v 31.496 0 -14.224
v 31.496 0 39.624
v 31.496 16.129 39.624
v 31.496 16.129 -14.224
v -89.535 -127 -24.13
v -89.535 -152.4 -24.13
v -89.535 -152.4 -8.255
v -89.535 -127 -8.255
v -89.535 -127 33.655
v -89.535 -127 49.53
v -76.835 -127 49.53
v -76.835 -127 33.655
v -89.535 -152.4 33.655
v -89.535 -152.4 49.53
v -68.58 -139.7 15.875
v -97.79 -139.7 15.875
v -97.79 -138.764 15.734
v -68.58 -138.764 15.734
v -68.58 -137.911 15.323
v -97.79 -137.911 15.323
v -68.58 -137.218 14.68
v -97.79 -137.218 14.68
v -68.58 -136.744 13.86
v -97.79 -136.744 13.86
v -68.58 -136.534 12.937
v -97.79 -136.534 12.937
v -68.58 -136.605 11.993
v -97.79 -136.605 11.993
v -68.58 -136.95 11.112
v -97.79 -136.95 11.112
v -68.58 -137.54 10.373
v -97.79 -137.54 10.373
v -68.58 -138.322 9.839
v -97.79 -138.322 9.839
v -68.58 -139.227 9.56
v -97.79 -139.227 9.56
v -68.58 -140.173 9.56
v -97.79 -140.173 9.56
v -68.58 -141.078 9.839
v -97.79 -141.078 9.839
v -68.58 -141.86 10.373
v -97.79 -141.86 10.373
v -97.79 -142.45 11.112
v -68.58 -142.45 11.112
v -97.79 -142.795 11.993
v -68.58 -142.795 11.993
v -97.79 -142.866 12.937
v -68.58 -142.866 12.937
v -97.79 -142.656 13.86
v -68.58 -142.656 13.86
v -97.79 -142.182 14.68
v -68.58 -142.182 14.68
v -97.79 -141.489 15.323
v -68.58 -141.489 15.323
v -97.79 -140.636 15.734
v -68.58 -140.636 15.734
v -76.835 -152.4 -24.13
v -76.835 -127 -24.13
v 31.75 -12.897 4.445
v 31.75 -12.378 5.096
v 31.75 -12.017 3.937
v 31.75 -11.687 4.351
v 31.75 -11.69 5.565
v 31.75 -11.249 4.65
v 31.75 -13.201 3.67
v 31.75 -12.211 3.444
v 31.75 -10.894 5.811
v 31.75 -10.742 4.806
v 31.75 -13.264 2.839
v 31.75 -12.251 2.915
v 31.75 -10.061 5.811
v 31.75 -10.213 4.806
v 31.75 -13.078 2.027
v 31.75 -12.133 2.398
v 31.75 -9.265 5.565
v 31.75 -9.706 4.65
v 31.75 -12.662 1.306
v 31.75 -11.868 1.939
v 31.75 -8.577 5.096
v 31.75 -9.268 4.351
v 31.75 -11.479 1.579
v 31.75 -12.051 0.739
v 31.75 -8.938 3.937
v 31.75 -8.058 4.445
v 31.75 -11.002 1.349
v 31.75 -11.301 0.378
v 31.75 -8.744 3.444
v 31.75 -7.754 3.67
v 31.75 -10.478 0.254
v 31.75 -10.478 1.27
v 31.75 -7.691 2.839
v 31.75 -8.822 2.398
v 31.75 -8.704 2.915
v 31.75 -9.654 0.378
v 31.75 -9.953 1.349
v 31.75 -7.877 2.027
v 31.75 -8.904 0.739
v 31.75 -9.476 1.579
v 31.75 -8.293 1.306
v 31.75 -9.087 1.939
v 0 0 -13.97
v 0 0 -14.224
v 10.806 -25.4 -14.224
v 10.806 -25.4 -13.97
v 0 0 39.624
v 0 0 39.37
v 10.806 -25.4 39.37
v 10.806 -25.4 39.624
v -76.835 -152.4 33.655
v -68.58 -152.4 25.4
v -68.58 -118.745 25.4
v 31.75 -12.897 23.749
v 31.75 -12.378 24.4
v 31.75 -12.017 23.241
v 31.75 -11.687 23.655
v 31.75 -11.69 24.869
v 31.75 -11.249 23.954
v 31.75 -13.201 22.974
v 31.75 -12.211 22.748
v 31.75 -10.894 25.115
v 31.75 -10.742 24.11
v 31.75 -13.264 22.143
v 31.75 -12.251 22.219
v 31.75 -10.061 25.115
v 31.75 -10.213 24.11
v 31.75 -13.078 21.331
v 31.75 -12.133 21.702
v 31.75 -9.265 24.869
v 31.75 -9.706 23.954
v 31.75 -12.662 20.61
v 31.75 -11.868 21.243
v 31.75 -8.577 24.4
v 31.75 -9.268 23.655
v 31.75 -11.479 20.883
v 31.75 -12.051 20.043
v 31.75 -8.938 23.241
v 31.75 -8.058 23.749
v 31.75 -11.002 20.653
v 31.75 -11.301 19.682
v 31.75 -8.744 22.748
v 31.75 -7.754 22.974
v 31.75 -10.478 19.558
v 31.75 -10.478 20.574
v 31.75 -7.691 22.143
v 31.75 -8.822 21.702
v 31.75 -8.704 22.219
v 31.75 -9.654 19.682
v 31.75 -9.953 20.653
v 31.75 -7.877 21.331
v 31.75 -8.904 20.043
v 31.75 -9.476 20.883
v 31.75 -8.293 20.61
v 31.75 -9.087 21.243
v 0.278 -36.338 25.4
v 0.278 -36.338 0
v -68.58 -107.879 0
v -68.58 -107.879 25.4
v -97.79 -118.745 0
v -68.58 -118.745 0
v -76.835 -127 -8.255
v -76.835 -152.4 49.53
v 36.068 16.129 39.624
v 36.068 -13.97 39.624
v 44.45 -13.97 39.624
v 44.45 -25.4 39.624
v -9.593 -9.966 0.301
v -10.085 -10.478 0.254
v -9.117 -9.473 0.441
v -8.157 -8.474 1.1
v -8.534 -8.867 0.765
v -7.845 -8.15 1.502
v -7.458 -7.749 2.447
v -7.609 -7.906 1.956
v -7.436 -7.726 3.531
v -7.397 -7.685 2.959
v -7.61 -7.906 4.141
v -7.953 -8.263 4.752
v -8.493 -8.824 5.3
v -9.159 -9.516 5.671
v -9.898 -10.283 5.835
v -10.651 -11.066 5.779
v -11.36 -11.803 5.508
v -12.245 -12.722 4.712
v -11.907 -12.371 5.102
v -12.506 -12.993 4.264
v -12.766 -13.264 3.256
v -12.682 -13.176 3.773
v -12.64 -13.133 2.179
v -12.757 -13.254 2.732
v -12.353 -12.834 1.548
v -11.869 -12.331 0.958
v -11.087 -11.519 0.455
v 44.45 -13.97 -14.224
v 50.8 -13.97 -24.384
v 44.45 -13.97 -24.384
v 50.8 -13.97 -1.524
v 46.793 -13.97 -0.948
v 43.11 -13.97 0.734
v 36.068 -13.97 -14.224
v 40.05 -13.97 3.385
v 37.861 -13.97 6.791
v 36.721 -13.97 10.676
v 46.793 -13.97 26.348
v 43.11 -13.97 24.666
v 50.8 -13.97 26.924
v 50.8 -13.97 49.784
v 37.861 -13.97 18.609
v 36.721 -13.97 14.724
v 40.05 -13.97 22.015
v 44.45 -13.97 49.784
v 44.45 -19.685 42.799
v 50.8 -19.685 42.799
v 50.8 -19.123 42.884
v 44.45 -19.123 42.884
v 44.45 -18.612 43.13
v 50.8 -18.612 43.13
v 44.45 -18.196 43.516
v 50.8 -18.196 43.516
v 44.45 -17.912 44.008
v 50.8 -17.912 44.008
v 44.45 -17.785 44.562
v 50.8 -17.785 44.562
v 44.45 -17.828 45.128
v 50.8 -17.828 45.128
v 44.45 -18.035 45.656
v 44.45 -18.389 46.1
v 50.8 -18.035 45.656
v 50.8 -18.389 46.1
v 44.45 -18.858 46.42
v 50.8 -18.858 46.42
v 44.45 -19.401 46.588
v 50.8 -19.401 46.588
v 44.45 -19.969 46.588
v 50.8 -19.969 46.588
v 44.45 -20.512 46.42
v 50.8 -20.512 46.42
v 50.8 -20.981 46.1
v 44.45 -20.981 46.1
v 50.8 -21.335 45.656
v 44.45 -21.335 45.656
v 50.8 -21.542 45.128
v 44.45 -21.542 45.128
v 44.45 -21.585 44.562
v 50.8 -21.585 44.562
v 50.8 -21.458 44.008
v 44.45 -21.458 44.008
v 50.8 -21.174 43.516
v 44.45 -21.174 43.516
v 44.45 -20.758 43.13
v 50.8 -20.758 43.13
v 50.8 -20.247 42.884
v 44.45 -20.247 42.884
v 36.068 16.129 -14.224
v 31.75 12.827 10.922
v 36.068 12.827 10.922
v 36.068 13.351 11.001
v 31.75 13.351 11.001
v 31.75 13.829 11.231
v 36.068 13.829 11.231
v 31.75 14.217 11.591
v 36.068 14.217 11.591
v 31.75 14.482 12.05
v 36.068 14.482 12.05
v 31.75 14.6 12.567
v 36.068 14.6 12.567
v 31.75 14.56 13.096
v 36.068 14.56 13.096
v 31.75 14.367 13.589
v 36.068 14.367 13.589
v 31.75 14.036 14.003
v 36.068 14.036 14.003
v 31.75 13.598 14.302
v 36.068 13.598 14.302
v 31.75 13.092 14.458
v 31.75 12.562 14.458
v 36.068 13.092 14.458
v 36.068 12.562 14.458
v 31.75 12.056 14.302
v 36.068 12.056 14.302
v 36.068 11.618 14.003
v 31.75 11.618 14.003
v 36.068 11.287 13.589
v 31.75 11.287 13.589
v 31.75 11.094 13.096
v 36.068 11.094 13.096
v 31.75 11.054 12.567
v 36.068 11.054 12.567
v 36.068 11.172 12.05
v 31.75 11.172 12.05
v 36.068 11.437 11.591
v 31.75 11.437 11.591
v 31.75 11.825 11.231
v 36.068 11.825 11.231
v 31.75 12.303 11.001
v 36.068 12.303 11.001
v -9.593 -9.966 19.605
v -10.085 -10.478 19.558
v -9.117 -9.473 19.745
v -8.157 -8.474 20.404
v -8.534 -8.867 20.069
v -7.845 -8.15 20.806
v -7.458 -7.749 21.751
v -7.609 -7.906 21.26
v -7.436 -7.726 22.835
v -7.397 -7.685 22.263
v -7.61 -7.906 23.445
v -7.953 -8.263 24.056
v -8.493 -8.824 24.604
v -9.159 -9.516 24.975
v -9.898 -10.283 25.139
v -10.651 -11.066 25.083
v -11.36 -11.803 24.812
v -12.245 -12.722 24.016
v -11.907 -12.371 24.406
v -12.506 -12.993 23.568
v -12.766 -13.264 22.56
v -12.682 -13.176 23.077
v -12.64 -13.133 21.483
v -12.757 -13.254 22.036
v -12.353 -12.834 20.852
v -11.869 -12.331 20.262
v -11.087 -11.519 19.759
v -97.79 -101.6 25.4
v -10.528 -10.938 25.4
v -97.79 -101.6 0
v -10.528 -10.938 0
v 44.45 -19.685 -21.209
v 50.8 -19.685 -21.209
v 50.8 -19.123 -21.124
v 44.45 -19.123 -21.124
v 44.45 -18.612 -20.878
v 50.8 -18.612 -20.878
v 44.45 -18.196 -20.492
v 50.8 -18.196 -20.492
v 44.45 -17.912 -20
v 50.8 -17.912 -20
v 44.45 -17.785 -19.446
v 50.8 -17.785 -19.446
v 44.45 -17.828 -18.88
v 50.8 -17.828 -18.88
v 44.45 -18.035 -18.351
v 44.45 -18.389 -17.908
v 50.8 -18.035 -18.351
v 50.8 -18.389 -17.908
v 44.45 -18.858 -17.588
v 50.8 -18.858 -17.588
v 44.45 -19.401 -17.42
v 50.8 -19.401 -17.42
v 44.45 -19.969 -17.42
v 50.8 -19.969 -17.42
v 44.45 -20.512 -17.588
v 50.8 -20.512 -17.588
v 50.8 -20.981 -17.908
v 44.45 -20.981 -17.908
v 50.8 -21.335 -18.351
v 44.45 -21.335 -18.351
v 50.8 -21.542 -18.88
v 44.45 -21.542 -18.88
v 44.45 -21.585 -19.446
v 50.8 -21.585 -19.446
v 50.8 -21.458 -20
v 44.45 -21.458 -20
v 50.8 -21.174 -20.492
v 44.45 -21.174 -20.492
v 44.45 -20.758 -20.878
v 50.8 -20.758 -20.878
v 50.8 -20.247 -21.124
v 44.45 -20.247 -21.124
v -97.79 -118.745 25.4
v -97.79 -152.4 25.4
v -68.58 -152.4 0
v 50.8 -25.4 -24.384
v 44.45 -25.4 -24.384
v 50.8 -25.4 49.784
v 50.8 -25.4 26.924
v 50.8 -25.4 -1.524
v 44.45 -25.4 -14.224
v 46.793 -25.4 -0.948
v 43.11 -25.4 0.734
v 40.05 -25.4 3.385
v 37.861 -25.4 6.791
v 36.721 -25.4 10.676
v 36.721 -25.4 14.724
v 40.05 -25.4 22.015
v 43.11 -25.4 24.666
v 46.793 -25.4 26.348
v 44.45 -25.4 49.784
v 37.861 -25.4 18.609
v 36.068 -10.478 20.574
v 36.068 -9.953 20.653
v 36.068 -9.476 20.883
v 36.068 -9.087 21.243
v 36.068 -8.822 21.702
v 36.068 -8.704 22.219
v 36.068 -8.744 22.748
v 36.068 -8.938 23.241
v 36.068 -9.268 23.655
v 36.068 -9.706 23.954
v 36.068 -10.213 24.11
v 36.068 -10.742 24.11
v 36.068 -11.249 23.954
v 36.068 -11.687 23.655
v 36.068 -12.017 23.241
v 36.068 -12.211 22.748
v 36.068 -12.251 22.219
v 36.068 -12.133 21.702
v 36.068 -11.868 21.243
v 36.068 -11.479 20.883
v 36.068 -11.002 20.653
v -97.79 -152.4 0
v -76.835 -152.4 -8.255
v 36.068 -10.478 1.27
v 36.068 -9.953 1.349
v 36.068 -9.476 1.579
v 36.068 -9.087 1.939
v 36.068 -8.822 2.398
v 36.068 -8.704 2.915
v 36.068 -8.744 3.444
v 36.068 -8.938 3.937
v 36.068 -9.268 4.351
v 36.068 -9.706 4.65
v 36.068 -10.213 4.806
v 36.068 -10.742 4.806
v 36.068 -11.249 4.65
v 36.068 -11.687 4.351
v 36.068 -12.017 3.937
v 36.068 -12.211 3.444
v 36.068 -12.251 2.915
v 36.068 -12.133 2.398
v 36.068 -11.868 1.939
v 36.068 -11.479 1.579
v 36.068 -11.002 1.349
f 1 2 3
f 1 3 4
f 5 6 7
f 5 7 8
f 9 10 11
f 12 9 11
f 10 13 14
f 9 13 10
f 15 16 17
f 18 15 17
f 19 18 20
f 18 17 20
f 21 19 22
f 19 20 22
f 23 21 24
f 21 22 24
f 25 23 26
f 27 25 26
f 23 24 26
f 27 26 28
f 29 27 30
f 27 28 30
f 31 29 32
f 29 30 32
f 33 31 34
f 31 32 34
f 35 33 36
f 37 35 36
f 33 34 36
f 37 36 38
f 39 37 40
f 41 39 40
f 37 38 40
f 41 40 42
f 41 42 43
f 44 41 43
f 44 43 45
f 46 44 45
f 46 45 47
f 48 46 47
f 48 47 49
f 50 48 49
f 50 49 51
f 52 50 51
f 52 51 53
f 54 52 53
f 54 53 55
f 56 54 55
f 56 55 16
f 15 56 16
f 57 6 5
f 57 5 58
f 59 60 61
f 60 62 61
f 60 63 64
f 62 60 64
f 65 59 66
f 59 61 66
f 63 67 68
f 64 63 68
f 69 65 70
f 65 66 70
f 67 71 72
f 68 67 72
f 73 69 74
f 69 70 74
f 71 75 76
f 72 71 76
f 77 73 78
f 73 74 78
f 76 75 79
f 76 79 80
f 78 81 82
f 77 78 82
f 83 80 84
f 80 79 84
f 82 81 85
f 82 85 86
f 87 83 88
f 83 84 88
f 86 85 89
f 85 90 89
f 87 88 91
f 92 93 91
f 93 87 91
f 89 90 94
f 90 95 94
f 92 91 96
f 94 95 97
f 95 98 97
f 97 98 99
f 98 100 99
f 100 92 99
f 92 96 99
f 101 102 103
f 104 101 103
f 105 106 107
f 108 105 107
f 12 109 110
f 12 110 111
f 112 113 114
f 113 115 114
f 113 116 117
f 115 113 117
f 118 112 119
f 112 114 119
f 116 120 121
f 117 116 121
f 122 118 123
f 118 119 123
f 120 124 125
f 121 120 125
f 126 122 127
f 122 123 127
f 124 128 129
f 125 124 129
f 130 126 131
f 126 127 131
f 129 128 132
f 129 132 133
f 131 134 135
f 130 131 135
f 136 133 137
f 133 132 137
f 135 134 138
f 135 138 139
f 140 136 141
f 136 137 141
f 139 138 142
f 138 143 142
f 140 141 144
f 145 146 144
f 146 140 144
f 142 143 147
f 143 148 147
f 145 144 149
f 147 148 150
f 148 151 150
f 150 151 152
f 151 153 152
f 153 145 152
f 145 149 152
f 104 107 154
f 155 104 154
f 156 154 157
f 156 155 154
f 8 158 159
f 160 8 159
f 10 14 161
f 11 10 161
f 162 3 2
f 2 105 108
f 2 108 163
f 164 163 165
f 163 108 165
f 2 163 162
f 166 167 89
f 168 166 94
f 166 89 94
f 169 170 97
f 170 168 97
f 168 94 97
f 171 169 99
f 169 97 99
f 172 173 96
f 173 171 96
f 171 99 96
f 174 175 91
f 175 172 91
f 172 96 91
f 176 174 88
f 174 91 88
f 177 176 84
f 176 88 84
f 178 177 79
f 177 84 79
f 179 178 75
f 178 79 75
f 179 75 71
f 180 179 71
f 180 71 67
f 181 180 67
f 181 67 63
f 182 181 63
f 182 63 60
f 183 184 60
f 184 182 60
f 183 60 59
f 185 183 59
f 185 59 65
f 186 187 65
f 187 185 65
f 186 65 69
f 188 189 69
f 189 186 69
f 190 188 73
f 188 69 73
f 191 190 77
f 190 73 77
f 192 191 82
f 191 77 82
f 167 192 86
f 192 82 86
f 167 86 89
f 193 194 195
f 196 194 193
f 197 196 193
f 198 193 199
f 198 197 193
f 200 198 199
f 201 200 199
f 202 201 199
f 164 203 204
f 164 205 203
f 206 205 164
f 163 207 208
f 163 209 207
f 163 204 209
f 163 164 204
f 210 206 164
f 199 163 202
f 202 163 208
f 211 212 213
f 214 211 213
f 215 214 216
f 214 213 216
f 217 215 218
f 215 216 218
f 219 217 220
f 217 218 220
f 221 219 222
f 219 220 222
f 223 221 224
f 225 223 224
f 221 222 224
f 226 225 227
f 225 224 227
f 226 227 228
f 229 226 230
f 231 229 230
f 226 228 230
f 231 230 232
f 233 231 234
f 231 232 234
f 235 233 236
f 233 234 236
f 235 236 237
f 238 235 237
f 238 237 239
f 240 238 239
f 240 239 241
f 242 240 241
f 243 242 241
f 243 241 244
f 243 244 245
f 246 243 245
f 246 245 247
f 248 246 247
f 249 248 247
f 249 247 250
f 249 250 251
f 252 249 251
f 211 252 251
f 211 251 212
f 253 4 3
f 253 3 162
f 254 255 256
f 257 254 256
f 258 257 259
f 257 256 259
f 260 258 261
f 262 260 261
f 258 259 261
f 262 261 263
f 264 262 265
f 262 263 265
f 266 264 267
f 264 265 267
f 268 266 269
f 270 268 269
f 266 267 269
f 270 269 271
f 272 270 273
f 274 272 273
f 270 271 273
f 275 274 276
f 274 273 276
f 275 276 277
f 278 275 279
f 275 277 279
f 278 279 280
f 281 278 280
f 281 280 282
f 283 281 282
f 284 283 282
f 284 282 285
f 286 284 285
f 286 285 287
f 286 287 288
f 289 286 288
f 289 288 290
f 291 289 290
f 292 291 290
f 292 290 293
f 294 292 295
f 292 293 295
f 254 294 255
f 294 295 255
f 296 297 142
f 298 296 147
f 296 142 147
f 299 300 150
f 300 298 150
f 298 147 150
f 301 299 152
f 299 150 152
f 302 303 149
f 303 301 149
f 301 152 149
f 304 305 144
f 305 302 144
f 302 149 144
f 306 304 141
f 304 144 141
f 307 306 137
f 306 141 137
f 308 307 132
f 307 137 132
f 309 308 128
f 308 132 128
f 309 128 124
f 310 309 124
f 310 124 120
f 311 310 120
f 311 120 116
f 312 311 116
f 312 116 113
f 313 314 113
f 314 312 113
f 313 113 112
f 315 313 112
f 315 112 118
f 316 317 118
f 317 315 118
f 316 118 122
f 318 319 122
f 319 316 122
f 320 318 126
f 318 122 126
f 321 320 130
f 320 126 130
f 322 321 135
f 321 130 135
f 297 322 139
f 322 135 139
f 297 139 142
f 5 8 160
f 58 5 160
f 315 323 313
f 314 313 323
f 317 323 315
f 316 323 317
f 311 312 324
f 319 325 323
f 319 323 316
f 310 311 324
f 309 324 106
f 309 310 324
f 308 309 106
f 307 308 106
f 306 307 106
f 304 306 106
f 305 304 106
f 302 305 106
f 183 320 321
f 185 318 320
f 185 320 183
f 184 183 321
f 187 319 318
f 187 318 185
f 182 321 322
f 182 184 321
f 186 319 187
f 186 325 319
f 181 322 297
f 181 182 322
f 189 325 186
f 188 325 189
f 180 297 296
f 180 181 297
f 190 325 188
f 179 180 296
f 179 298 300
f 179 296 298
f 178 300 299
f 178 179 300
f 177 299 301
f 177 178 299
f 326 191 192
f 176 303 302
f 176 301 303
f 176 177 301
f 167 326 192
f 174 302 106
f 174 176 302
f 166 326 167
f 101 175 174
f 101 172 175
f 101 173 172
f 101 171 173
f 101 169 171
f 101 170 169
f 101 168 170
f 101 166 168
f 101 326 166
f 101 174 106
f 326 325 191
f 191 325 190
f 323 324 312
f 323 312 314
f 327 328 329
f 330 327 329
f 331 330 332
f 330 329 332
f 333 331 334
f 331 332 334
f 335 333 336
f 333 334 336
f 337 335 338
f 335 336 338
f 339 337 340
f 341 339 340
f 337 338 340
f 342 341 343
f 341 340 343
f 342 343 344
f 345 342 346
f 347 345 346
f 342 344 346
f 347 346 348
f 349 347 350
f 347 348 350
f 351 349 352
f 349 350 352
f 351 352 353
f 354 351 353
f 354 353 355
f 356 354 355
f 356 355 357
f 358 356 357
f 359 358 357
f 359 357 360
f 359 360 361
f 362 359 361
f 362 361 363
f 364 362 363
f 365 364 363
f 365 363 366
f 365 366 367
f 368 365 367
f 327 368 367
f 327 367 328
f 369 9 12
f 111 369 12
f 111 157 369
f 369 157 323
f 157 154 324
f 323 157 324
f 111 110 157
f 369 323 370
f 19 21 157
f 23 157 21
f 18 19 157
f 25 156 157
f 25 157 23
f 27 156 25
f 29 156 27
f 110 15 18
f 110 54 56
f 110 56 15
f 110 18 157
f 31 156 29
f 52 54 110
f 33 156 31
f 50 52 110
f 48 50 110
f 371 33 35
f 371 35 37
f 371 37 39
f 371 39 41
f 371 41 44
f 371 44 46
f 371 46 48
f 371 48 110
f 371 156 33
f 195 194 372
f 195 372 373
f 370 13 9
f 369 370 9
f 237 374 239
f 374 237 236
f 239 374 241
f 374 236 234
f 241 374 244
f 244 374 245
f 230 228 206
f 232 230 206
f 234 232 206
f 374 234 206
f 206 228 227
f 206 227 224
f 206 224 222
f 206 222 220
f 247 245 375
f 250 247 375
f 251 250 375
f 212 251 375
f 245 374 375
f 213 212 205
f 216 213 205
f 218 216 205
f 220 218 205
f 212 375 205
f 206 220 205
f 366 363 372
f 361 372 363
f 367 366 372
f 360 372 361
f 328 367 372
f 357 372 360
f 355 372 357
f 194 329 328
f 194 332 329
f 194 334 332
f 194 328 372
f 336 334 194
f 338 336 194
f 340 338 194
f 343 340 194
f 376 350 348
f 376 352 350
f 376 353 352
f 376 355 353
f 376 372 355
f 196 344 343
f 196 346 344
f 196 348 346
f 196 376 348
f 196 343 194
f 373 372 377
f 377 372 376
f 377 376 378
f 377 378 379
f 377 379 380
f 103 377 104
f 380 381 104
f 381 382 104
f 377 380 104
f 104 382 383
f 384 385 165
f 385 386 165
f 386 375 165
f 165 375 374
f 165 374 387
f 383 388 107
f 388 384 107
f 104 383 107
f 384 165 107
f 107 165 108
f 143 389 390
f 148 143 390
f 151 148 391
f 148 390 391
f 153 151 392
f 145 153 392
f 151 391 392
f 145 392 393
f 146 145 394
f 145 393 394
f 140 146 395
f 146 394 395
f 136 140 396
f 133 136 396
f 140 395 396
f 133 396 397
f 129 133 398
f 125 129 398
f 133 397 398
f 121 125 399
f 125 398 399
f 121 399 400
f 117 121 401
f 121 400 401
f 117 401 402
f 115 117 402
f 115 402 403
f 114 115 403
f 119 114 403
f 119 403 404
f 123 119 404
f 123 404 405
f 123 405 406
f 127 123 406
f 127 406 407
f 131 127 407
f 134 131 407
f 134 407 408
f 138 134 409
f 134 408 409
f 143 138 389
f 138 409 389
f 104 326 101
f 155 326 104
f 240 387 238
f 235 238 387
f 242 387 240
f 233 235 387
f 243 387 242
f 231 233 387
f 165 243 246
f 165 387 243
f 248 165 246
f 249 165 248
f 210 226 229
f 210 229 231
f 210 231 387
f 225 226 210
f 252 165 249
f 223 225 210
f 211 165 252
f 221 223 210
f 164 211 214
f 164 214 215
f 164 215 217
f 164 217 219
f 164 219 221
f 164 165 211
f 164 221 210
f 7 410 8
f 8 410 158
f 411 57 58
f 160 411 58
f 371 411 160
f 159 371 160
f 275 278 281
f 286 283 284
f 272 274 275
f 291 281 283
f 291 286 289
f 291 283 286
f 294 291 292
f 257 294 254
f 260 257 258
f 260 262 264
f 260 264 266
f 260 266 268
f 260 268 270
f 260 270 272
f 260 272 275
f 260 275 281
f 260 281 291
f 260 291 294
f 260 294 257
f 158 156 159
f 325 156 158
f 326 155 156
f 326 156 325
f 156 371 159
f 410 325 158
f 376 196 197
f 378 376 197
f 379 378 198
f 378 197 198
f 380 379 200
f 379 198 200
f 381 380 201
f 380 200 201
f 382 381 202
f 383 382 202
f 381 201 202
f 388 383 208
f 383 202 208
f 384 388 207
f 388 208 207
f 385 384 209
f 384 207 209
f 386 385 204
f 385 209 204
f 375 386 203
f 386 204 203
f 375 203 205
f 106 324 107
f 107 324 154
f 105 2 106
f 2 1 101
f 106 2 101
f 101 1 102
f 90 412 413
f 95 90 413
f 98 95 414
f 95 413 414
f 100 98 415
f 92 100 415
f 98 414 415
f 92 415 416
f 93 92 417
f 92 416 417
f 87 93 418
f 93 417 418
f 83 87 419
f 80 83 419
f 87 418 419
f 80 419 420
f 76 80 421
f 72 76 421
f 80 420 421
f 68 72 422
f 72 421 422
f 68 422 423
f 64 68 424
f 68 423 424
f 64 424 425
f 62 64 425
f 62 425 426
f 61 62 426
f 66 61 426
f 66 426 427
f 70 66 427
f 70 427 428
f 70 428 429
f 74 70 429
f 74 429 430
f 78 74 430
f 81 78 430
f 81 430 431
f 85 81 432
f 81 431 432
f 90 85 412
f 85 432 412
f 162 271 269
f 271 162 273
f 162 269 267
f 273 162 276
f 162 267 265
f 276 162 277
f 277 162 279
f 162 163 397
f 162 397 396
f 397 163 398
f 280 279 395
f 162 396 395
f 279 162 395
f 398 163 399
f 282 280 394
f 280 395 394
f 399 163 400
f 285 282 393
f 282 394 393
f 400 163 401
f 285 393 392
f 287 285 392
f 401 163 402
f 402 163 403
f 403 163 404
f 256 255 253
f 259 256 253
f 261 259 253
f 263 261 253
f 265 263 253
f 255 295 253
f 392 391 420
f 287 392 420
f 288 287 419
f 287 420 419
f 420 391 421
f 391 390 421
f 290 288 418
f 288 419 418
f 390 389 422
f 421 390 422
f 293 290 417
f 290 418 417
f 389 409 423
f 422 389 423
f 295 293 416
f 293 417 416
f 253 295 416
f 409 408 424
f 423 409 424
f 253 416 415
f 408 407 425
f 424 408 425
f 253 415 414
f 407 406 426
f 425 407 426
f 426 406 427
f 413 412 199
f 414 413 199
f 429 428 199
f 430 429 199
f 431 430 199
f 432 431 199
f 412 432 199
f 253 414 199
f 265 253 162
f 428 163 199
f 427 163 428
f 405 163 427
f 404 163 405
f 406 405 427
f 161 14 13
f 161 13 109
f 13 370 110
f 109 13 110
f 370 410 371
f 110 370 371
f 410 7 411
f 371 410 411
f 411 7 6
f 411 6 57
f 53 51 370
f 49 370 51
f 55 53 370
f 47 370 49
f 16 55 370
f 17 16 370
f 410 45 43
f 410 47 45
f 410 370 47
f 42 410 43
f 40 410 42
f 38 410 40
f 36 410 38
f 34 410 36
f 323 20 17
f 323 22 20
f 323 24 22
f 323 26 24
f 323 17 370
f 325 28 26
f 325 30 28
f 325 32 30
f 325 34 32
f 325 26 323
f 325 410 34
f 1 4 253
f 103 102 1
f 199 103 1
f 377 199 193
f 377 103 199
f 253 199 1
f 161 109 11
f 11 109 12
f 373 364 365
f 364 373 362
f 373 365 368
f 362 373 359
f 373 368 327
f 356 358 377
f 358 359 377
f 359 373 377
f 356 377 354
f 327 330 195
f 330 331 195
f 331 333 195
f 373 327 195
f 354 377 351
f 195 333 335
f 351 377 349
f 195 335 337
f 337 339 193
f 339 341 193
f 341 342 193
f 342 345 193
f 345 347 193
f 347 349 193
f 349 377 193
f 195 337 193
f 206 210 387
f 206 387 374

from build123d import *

# Parameters (mm, degrees)
BOSS_EXTRUDE1_DEPTH      = 25.4
BOSS_EXTRUDE4_DEPTH      = 24.13
BOSS_EXTRUDE4_DEPTH_BACK = 49.53
SKETCH7_W                = 12.7
SKETCH7_H                = 25.4
SKETCH8_R                = 3.175
CUT_EXTRUDE3_DEPTH       = 219.535967291
CHAMFER3_SIZE            = 8.255
BOSS_EXTRUDE5_DEPTH      = 14.224
BOSS_EXTRUDE5_DEPTH_BACK = 39.624
SKETCH9_R                = 14.224
CUT_EXTRUDE4_DEPTH       = 188.728167838
SKETCH11_W               = 14.732
SKETCH11_H               = 53.848
CUT_EXTRUDE5_DEPTH       = 13.97
CHAMFER5_SIZE            = 13.97
SKETCH18_W               = 6.35
SKETCH18_H               = 11.43
BOSS_EXTRUDE6_DEPTH      = 10.16
SKETCH19_W               = 6.35
SKETCH19_H               = 11.43
BOSS_EXTRUDE7_DEPTH      = 10.16
SKETCH20_R               = 1.905
CUT_EXTRUDE7_DEPTH       = 10.16
SKETCH21_W               = 4.572
SKETCH21_H               = 53.848
BOSS_EXTRUDE8_DEPTH      = 16.129
SKETCH22_R               = 1.778
CUT_EXTRUDE8_DEPTH       = 4.318
SKETCH23_R               = 2.794
CUT_EXTRUDE9_DEPTH       = 207.118456854


with BuildPart() as part:
    # Sketch2 → Boss-Extrude1 (new body)
    with BuildSketch(Plane.XY):
        Polygon((0, 0), (50.8, 0), (50.8, -25.4), (10.806439585, -25.4), (-68.58, -107.87941775), (-68.58, -152.4), (-97.79, -152.4), (-97.79, -101.6), align=None)
    extrude(amount=BOSS_EXTRUDE1_DEPTH)

    # Sketch7 → Boss-Extrude4 (add, two sides: drawn at the far end of the back side and taken through both)
    with BuildSketch(Plane.XY.offset(25.4).offset(-BOSS_EXTRUDE4_DEPTH_BACK)):
        with Locations((-83.185, -139.7)):
            Rectangle(SKETCH7_W, SKETCH7_H)
    extrude(amount=BOSS_EXTRUDE4_DEPTH + BOSS_EXTRUDE4_DEPTH_BACK)

    # Sketch8 → Cut-Extrude3 (cut, through all)
    with BuildSketch(Plane.ZY.offset(97.79)):
        with Locations((12.7, -139.7)):
            Circle(SKETCH8_R)
    extrude(amount=-CUT_EXTRUDE3_DEPTH, mode=Mode.SUBTRACT)

    # Chamfer3
    chamfer3_edges = [part.edges().sort_by_distance(p)[0] for p in [
        (-76.835, -139.7, 25.4),
        (-76.835, -139.7, 0),
        (-83.185, -127, 25.4),
        (-83.185, -127, 0),
        (-89.535, -139.7, 25.4),
        (-89.535, -139.7, 0),
    ]]
    chamfer(chamfer3_edges, length=CHAMFER3_SIZE - 0.0001)  # a hair under: the kernel refuses the full size

    # Sketch10 → Boss-Extrude5 (add, two sides: drawn at the far end of the back side and taken through both)
    with BuildSketch(Plane.XY.offset(25.4).offset(-BOSS_EXTRUDE5_DEPTH_BACK)):
        Polygon((0, 0), (10.806439585, -25.4), (50.8, -25.4), (50.8, 0), align=None)
    extrude(amount=BOSS_EXTRUDE5_DEPTH + BOSS_EXTRUDE5_DEPTH_BACK)

    # Sketch9 → Cut-Extrude4 (cut, through all)
    with BuildSketch(Plane(origin=(0, 0, 0), x_dir=(1, 0, 0), z_dir=(0, 1, 0))):
        with Locations((50.8, -12.7)):
            Circle(SKETCH9_R)
    extrude(amount=-CUT_EXTRUDE4_DEPTH, mode=Mode.SUBTRACT)

    # Sketch11 → Cut-Extrude5 (cut)
    with BuildSketch(Plane(origin=(0, 0, 0), x_dir=(1, 0, 0), z_dir=(0, 1, 0))):
        with Locations((43.434, -12.7)):
            Rectangle(SKETCH11_W, SKETCH11_H)
    extrude(amount=-CUT_EXTRUDE5_DEPTH, mode=Mode.SUBTRACT)

    # Chamfer5
    chamfer5_edges = [part.edges().sort_by_distance(p)[0] for p in [
        (5.403219792, -12.7, 0),
        (5.403219792, -12.7, 25.4),
    ]]
    chamfer(chamfer5_edges, length=CHAMFER5_SIZE)

    # Sketch18 → Boss-Extrude6 (add)
    with BuildSketch(Plane.XY.offset(39.624)):
        with Locations((47.625, -19.685)):
            Rectangle(SKETCH18_W, SKETCH18_H)
    extrude(amount=BOSS_EXTRUDE6_DEPTH)

    # Sketch19 → Boss-Extrude7 (add)
    with BuildSketch(Plane(origin=(0, 0, -14.224), x_dir=(-1, 0, 0), z_dir=(0, 0, -1))):
        with Locations((-47.625, -19.685)):
            Rectangle(SKETCH19_W, SKETCH19_H)
    extrude(amount=BOSS_EXTRUDE7_DEPTH)

    # Sketch20 → Cut-Extrude7 (cut)
    with BuildSketch(Plane(origin=(50.8, 0, 0), x_dir=(0, 0, -1), z_dir=(1, 0, 0))):
        with Locations((-44.704, -19.685)):
            Circle(SKETCH20_R)
        with Locations((19.304, -19.685)):
            Circle(SKETCH20_R)
    extrude(amount=-CUT_EXTRUDE7_DEPTH, mode=Mode.SUBTRACT)

    # Sketch21 → Boss-Extrude8 (add)
    with BuildSketch(Plane(origin=(0, 0, 0), x_dir=(1, 0, 0), z_dir=(0, 1, 0))):
        with Locations((33.782, -12.7)):
            Rectangle(SKETCH21_W, SKETCH21_H)
    extrude(amount=BOSS_EXTRUDE8_DEPTH)

    # Sketch22 → Cut-Extrude8 (cut)
    with BuildSketch(Plane(origin=(36.068, 0, 0), x_dir=(0, 0, -1), z_dir=(1, 0, 0))):
        with Locations((-12.7, 12.827)):
            Circle(SKETCH22_R)
        with Locations((-22.352, -10.4775)):
            Circle(SKETCH22_R)
        with Locations((-3.048, -10.4775)):
            Circle(SKETCH22_R)
    extrude(amount=-CUT_EXTRUDE8_DEPTH, mode=Mode.SUBTRACT)

    # Sketch23 → Cut-Extrude9 (cut, through all)
    with BuildSketch(Plane(origin=(31.75, 0, 0), x_dir=(0, 0, -1), z_dir=(1, 0, 0))):
        with Locations((-22.352, -10.4775)):
            Circle(SKETCH23_R)
        with Locations((-3.048, -10.4775)):
            Circle(SKETCH23_R)
    extrude(amount=-CUT_EXTRUDE9_DEPTH, mode=Mode.SUBTRACT)


solid = part.part
